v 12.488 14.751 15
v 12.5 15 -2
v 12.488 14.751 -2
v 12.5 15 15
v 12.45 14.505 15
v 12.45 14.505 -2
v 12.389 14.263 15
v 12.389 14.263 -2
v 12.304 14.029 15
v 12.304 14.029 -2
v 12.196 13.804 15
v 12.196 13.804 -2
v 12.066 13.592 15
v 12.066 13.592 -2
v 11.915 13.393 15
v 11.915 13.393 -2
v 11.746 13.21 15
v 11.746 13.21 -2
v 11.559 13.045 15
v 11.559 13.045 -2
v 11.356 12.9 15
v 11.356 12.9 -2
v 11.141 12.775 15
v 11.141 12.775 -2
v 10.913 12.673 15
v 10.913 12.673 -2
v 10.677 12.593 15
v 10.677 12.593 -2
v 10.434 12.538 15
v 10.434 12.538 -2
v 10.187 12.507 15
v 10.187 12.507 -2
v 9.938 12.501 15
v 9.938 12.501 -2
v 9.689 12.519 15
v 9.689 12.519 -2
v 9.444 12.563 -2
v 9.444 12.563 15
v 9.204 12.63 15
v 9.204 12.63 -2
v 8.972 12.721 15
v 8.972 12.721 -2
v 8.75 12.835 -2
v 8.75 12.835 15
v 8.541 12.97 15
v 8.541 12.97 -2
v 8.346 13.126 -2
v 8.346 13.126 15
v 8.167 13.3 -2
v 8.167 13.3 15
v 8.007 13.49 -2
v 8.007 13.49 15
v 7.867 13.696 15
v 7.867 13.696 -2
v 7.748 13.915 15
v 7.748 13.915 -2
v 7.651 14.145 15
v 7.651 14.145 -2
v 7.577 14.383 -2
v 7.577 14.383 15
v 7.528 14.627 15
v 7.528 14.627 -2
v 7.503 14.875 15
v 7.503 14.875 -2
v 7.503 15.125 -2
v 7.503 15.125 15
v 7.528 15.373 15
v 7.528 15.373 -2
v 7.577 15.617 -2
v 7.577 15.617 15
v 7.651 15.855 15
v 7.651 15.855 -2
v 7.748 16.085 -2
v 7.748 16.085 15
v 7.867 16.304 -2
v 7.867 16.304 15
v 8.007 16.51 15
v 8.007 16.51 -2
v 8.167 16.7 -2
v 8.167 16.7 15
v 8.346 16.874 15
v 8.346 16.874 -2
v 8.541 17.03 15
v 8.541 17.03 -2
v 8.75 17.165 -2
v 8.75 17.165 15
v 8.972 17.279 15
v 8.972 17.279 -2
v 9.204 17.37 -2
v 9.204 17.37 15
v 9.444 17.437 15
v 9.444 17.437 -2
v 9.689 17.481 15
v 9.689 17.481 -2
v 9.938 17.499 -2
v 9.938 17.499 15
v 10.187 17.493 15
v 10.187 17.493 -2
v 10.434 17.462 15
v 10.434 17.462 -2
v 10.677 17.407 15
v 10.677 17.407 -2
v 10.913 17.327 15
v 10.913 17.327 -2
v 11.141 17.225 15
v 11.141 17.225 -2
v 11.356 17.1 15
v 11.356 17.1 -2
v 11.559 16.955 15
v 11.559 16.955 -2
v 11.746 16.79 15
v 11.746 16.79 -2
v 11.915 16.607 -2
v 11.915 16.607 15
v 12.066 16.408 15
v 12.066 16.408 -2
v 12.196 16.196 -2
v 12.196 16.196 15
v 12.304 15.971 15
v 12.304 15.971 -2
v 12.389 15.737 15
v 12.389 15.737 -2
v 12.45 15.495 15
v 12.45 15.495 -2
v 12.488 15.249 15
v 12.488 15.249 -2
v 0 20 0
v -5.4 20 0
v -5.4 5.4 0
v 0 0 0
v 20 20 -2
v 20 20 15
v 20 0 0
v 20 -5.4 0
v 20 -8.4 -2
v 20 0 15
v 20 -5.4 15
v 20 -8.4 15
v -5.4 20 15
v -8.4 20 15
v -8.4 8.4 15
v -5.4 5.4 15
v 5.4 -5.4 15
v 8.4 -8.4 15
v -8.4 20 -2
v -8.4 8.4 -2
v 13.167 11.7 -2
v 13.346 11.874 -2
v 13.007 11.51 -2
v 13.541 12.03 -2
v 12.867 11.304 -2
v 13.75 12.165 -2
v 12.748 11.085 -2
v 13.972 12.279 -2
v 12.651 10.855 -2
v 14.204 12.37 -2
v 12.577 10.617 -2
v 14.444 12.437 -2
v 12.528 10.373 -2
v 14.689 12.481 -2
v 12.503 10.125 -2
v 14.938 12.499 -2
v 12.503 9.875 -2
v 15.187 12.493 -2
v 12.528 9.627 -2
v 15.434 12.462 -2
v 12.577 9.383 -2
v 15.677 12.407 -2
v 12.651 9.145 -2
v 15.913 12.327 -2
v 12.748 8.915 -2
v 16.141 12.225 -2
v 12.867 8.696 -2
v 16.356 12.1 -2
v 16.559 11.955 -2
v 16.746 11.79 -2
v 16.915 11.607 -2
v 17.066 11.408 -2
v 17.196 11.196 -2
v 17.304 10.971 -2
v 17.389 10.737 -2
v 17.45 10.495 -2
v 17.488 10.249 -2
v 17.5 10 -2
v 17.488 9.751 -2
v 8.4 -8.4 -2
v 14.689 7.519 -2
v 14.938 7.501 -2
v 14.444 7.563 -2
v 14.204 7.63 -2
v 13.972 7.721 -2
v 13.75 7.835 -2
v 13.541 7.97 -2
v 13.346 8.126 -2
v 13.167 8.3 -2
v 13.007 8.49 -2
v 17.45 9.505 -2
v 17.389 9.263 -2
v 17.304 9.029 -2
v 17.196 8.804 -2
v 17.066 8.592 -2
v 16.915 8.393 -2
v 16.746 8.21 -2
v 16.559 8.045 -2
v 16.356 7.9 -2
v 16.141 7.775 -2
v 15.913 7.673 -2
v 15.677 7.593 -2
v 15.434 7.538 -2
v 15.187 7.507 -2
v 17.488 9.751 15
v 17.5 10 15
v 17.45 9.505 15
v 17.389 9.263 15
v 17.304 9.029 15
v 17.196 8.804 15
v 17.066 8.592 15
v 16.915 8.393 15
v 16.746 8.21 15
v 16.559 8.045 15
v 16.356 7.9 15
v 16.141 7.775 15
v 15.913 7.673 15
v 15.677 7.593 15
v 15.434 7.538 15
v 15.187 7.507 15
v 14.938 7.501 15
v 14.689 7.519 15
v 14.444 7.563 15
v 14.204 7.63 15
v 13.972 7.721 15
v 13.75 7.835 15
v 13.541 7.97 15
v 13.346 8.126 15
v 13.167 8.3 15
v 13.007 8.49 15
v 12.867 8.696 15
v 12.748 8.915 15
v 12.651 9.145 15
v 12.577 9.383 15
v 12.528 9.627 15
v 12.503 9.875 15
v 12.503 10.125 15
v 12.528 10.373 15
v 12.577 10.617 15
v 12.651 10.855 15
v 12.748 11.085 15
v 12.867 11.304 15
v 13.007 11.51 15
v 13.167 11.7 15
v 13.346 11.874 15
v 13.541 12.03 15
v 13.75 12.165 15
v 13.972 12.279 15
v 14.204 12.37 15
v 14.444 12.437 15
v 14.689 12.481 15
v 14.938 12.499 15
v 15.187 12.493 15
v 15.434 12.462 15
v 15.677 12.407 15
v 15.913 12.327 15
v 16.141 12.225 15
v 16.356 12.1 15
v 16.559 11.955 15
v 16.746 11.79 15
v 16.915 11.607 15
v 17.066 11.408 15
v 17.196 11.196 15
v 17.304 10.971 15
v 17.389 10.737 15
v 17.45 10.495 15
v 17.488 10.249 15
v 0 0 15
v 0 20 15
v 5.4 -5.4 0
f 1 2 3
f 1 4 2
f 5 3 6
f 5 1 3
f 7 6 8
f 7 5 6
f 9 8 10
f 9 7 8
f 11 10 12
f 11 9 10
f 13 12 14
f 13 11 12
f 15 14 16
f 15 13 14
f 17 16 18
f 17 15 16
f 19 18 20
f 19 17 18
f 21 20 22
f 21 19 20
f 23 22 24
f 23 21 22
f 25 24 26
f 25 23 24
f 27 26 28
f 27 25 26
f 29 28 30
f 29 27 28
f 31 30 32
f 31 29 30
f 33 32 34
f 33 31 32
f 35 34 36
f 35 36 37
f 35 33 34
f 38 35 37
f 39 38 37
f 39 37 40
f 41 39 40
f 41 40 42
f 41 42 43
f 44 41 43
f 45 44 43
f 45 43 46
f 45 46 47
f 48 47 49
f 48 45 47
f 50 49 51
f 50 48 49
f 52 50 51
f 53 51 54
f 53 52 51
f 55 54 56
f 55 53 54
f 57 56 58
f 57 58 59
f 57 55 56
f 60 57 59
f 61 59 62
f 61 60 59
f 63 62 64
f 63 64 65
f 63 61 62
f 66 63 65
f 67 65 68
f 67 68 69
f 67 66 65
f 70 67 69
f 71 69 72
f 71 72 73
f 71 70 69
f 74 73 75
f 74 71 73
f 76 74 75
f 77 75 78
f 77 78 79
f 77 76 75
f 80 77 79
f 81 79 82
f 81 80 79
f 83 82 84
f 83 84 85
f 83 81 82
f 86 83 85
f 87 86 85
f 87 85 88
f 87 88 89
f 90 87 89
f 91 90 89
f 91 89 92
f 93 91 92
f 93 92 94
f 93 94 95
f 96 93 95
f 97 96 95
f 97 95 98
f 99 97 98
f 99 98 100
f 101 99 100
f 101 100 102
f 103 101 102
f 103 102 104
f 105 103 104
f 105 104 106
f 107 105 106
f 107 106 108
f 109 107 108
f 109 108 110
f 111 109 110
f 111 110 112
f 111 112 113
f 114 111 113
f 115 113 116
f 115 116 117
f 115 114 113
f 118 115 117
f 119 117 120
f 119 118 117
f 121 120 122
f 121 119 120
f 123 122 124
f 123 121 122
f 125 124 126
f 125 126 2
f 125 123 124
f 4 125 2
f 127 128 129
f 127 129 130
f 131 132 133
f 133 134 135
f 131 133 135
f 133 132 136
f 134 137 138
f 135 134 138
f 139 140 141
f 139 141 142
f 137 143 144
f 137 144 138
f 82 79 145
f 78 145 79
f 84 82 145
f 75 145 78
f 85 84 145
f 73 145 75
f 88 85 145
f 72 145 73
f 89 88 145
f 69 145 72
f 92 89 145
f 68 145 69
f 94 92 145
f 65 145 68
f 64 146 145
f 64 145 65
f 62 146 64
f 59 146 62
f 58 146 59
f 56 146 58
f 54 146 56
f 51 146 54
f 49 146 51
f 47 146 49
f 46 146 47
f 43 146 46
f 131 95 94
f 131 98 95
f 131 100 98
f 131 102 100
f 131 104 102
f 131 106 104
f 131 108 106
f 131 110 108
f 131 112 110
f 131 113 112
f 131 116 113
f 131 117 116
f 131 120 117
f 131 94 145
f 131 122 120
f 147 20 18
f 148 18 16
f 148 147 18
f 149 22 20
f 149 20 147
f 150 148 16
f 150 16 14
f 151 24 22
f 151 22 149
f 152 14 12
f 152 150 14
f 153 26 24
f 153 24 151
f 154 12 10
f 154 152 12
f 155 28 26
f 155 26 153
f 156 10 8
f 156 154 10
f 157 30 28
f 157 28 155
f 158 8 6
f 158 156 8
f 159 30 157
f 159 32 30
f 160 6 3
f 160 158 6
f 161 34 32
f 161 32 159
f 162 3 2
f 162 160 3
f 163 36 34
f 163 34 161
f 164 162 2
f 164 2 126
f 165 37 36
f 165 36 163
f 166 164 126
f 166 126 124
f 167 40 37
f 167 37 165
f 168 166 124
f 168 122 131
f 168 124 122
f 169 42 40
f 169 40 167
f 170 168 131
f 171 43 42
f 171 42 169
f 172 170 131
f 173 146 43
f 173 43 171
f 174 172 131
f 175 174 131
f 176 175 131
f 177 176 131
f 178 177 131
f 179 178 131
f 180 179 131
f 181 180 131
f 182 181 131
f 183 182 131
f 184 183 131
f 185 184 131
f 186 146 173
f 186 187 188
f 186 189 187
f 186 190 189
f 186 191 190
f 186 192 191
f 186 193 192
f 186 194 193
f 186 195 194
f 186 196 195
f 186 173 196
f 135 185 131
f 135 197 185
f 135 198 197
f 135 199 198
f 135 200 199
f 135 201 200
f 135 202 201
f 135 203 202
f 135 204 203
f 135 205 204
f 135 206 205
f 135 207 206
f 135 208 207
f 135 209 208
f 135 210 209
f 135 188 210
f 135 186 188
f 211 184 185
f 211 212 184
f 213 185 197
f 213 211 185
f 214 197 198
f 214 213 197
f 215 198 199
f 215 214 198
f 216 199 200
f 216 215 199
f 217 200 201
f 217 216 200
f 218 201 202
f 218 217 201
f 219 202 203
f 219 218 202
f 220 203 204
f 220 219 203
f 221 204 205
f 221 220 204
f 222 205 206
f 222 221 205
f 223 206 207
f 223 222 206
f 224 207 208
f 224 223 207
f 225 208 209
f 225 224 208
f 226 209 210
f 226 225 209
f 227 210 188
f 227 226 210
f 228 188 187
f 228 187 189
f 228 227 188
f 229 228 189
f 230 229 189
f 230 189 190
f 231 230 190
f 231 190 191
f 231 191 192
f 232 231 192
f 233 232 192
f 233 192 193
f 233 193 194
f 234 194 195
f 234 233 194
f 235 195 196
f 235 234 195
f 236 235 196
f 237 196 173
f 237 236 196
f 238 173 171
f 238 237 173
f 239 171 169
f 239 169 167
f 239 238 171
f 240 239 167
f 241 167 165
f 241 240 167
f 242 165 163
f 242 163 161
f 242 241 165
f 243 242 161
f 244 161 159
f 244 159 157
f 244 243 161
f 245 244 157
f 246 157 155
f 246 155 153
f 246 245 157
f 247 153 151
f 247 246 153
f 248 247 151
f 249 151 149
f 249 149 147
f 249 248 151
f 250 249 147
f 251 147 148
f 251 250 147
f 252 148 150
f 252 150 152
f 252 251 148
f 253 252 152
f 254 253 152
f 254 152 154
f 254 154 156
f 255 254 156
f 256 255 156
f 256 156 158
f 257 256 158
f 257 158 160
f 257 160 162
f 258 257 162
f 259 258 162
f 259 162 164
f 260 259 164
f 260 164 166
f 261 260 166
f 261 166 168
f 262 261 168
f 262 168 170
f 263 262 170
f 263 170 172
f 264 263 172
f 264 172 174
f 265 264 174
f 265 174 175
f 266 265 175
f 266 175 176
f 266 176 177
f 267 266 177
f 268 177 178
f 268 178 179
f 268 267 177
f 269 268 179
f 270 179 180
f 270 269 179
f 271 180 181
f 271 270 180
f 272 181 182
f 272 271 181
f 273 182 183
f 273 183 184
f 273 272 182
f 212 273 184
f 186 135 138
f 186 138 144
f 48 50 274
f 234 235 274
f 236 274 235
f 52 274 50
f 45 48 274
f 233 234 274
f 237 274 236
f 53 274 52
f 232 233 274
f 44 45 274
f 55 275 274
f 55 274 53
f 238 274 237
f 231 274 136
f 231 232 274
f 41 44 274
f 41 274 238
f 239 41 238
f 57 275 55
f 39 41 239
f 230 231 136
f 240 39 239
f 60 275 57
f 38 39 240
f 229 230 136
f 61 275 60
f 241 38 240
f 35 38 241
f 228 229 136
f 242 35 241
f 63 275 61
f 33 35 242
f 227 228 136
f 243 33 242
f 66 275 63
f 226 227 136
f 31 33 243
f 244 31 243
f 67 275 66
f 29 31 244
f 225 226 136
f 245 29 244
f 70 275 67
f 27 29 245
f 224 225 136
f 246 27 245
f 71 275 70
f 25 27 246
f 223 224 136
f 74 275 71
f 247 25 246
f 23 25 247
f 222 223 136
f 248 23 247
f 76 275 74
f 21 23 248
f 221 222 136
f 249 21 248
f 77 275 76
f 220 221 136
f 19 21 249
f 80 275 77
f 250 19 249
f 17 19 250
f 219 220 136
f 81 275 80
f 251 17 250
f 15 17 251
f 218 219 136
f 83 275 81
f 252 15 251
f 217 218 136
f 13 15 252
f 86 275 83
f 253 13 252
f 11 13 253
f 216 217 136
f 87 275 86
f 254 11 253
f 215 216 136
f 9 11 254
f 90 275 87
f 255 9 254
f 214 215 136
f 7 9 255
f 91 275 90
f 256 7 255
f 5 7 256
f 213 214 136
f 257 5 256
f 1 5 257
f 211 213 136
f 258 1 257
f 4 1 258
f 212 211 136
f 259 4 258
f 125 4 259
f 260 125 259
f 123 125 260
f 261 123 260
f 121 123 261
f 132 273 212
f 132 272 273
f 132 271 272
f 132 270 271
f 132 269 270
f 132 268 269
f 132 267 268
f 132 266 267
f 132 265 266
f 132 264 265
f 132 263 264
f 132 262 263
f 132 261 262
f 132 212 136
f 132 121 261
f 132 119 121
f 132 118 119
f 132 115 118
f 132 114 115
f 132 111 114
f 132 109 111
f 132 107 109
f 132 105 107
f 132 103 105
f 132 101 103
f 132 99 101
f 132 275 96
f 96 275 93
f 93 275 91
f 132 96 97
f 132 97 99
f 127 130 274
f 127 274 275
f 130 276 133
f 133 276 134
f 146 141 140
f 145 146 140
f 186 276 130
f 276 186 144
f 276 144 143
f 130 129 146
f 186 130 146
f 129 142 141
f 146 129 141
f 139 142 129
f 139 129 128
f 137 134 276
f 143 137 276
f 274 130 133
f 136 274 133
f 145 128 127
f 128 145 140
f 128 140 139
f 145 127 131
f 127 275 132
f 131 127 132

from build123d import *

# Parameters (mm, degrees)
F0_W     = 20
F0_H     = 20
F0_R     = 2.5
F1_DEPTH = 15
F3_DEPTH = 15
F4_R     = 2.5
F5_DEPTH = 2


with BuildPart() as f1:
    # F0 (on Top) → F1 (new body)
    with BuildSketch(Plane.XY):
        with Locations((10, 10)):
            Rectangle(F0_W, F0_H)
        with Locations((15, 10)):
            Circle(F0_R, mode=Mode.SUBTRACT)
        with Locations((10, 15)):
            Circle(F0_R, mode=Mode.SUBTRACT)
    extrude(amount=F1_DEPTH)



with BuildPart() as f3:
    # F2 (on Top) → F3 (new body, through all)
    with BuildSketch(Plane.XY):
        Polygon((-5.4, 8.4), (-5.4, 20), (-8.4, 20), (-8.4, 8.4), (-5.4, 5.4), align=None)
        Polygon((20, -8.4), (20, -5.4), (8.4, -5.4), (5.4, -5.4), (8.4, -8.4), align=None)
    extrude(amount=F3_DEPTH)


with BuildPart() as f1_1:
    add(f1.part)

    add(f3.part)  # F5 merges F3
    # F4 (on face) → F5 (join)
    with BuildSketch(Plane(origin=(0, 0, 0), x_dir=(1, 0, 0), z_dir=(0, 0, -1))):
        Polygon((-8.4, -20), (20, -20), (20, 8.4), (8.4, 8.4), (-8.4, -8.4), align=None)
        with Locations((10, -15)):
            Circle(F4_R, mode=Mode.SUBTRACT)
        with Locations((15, -10)):
            Circle(F4_R, mode=Mode.SUBTRACT)
    extrude(amount=F5_DEPTH)


solid = f1_1.part
